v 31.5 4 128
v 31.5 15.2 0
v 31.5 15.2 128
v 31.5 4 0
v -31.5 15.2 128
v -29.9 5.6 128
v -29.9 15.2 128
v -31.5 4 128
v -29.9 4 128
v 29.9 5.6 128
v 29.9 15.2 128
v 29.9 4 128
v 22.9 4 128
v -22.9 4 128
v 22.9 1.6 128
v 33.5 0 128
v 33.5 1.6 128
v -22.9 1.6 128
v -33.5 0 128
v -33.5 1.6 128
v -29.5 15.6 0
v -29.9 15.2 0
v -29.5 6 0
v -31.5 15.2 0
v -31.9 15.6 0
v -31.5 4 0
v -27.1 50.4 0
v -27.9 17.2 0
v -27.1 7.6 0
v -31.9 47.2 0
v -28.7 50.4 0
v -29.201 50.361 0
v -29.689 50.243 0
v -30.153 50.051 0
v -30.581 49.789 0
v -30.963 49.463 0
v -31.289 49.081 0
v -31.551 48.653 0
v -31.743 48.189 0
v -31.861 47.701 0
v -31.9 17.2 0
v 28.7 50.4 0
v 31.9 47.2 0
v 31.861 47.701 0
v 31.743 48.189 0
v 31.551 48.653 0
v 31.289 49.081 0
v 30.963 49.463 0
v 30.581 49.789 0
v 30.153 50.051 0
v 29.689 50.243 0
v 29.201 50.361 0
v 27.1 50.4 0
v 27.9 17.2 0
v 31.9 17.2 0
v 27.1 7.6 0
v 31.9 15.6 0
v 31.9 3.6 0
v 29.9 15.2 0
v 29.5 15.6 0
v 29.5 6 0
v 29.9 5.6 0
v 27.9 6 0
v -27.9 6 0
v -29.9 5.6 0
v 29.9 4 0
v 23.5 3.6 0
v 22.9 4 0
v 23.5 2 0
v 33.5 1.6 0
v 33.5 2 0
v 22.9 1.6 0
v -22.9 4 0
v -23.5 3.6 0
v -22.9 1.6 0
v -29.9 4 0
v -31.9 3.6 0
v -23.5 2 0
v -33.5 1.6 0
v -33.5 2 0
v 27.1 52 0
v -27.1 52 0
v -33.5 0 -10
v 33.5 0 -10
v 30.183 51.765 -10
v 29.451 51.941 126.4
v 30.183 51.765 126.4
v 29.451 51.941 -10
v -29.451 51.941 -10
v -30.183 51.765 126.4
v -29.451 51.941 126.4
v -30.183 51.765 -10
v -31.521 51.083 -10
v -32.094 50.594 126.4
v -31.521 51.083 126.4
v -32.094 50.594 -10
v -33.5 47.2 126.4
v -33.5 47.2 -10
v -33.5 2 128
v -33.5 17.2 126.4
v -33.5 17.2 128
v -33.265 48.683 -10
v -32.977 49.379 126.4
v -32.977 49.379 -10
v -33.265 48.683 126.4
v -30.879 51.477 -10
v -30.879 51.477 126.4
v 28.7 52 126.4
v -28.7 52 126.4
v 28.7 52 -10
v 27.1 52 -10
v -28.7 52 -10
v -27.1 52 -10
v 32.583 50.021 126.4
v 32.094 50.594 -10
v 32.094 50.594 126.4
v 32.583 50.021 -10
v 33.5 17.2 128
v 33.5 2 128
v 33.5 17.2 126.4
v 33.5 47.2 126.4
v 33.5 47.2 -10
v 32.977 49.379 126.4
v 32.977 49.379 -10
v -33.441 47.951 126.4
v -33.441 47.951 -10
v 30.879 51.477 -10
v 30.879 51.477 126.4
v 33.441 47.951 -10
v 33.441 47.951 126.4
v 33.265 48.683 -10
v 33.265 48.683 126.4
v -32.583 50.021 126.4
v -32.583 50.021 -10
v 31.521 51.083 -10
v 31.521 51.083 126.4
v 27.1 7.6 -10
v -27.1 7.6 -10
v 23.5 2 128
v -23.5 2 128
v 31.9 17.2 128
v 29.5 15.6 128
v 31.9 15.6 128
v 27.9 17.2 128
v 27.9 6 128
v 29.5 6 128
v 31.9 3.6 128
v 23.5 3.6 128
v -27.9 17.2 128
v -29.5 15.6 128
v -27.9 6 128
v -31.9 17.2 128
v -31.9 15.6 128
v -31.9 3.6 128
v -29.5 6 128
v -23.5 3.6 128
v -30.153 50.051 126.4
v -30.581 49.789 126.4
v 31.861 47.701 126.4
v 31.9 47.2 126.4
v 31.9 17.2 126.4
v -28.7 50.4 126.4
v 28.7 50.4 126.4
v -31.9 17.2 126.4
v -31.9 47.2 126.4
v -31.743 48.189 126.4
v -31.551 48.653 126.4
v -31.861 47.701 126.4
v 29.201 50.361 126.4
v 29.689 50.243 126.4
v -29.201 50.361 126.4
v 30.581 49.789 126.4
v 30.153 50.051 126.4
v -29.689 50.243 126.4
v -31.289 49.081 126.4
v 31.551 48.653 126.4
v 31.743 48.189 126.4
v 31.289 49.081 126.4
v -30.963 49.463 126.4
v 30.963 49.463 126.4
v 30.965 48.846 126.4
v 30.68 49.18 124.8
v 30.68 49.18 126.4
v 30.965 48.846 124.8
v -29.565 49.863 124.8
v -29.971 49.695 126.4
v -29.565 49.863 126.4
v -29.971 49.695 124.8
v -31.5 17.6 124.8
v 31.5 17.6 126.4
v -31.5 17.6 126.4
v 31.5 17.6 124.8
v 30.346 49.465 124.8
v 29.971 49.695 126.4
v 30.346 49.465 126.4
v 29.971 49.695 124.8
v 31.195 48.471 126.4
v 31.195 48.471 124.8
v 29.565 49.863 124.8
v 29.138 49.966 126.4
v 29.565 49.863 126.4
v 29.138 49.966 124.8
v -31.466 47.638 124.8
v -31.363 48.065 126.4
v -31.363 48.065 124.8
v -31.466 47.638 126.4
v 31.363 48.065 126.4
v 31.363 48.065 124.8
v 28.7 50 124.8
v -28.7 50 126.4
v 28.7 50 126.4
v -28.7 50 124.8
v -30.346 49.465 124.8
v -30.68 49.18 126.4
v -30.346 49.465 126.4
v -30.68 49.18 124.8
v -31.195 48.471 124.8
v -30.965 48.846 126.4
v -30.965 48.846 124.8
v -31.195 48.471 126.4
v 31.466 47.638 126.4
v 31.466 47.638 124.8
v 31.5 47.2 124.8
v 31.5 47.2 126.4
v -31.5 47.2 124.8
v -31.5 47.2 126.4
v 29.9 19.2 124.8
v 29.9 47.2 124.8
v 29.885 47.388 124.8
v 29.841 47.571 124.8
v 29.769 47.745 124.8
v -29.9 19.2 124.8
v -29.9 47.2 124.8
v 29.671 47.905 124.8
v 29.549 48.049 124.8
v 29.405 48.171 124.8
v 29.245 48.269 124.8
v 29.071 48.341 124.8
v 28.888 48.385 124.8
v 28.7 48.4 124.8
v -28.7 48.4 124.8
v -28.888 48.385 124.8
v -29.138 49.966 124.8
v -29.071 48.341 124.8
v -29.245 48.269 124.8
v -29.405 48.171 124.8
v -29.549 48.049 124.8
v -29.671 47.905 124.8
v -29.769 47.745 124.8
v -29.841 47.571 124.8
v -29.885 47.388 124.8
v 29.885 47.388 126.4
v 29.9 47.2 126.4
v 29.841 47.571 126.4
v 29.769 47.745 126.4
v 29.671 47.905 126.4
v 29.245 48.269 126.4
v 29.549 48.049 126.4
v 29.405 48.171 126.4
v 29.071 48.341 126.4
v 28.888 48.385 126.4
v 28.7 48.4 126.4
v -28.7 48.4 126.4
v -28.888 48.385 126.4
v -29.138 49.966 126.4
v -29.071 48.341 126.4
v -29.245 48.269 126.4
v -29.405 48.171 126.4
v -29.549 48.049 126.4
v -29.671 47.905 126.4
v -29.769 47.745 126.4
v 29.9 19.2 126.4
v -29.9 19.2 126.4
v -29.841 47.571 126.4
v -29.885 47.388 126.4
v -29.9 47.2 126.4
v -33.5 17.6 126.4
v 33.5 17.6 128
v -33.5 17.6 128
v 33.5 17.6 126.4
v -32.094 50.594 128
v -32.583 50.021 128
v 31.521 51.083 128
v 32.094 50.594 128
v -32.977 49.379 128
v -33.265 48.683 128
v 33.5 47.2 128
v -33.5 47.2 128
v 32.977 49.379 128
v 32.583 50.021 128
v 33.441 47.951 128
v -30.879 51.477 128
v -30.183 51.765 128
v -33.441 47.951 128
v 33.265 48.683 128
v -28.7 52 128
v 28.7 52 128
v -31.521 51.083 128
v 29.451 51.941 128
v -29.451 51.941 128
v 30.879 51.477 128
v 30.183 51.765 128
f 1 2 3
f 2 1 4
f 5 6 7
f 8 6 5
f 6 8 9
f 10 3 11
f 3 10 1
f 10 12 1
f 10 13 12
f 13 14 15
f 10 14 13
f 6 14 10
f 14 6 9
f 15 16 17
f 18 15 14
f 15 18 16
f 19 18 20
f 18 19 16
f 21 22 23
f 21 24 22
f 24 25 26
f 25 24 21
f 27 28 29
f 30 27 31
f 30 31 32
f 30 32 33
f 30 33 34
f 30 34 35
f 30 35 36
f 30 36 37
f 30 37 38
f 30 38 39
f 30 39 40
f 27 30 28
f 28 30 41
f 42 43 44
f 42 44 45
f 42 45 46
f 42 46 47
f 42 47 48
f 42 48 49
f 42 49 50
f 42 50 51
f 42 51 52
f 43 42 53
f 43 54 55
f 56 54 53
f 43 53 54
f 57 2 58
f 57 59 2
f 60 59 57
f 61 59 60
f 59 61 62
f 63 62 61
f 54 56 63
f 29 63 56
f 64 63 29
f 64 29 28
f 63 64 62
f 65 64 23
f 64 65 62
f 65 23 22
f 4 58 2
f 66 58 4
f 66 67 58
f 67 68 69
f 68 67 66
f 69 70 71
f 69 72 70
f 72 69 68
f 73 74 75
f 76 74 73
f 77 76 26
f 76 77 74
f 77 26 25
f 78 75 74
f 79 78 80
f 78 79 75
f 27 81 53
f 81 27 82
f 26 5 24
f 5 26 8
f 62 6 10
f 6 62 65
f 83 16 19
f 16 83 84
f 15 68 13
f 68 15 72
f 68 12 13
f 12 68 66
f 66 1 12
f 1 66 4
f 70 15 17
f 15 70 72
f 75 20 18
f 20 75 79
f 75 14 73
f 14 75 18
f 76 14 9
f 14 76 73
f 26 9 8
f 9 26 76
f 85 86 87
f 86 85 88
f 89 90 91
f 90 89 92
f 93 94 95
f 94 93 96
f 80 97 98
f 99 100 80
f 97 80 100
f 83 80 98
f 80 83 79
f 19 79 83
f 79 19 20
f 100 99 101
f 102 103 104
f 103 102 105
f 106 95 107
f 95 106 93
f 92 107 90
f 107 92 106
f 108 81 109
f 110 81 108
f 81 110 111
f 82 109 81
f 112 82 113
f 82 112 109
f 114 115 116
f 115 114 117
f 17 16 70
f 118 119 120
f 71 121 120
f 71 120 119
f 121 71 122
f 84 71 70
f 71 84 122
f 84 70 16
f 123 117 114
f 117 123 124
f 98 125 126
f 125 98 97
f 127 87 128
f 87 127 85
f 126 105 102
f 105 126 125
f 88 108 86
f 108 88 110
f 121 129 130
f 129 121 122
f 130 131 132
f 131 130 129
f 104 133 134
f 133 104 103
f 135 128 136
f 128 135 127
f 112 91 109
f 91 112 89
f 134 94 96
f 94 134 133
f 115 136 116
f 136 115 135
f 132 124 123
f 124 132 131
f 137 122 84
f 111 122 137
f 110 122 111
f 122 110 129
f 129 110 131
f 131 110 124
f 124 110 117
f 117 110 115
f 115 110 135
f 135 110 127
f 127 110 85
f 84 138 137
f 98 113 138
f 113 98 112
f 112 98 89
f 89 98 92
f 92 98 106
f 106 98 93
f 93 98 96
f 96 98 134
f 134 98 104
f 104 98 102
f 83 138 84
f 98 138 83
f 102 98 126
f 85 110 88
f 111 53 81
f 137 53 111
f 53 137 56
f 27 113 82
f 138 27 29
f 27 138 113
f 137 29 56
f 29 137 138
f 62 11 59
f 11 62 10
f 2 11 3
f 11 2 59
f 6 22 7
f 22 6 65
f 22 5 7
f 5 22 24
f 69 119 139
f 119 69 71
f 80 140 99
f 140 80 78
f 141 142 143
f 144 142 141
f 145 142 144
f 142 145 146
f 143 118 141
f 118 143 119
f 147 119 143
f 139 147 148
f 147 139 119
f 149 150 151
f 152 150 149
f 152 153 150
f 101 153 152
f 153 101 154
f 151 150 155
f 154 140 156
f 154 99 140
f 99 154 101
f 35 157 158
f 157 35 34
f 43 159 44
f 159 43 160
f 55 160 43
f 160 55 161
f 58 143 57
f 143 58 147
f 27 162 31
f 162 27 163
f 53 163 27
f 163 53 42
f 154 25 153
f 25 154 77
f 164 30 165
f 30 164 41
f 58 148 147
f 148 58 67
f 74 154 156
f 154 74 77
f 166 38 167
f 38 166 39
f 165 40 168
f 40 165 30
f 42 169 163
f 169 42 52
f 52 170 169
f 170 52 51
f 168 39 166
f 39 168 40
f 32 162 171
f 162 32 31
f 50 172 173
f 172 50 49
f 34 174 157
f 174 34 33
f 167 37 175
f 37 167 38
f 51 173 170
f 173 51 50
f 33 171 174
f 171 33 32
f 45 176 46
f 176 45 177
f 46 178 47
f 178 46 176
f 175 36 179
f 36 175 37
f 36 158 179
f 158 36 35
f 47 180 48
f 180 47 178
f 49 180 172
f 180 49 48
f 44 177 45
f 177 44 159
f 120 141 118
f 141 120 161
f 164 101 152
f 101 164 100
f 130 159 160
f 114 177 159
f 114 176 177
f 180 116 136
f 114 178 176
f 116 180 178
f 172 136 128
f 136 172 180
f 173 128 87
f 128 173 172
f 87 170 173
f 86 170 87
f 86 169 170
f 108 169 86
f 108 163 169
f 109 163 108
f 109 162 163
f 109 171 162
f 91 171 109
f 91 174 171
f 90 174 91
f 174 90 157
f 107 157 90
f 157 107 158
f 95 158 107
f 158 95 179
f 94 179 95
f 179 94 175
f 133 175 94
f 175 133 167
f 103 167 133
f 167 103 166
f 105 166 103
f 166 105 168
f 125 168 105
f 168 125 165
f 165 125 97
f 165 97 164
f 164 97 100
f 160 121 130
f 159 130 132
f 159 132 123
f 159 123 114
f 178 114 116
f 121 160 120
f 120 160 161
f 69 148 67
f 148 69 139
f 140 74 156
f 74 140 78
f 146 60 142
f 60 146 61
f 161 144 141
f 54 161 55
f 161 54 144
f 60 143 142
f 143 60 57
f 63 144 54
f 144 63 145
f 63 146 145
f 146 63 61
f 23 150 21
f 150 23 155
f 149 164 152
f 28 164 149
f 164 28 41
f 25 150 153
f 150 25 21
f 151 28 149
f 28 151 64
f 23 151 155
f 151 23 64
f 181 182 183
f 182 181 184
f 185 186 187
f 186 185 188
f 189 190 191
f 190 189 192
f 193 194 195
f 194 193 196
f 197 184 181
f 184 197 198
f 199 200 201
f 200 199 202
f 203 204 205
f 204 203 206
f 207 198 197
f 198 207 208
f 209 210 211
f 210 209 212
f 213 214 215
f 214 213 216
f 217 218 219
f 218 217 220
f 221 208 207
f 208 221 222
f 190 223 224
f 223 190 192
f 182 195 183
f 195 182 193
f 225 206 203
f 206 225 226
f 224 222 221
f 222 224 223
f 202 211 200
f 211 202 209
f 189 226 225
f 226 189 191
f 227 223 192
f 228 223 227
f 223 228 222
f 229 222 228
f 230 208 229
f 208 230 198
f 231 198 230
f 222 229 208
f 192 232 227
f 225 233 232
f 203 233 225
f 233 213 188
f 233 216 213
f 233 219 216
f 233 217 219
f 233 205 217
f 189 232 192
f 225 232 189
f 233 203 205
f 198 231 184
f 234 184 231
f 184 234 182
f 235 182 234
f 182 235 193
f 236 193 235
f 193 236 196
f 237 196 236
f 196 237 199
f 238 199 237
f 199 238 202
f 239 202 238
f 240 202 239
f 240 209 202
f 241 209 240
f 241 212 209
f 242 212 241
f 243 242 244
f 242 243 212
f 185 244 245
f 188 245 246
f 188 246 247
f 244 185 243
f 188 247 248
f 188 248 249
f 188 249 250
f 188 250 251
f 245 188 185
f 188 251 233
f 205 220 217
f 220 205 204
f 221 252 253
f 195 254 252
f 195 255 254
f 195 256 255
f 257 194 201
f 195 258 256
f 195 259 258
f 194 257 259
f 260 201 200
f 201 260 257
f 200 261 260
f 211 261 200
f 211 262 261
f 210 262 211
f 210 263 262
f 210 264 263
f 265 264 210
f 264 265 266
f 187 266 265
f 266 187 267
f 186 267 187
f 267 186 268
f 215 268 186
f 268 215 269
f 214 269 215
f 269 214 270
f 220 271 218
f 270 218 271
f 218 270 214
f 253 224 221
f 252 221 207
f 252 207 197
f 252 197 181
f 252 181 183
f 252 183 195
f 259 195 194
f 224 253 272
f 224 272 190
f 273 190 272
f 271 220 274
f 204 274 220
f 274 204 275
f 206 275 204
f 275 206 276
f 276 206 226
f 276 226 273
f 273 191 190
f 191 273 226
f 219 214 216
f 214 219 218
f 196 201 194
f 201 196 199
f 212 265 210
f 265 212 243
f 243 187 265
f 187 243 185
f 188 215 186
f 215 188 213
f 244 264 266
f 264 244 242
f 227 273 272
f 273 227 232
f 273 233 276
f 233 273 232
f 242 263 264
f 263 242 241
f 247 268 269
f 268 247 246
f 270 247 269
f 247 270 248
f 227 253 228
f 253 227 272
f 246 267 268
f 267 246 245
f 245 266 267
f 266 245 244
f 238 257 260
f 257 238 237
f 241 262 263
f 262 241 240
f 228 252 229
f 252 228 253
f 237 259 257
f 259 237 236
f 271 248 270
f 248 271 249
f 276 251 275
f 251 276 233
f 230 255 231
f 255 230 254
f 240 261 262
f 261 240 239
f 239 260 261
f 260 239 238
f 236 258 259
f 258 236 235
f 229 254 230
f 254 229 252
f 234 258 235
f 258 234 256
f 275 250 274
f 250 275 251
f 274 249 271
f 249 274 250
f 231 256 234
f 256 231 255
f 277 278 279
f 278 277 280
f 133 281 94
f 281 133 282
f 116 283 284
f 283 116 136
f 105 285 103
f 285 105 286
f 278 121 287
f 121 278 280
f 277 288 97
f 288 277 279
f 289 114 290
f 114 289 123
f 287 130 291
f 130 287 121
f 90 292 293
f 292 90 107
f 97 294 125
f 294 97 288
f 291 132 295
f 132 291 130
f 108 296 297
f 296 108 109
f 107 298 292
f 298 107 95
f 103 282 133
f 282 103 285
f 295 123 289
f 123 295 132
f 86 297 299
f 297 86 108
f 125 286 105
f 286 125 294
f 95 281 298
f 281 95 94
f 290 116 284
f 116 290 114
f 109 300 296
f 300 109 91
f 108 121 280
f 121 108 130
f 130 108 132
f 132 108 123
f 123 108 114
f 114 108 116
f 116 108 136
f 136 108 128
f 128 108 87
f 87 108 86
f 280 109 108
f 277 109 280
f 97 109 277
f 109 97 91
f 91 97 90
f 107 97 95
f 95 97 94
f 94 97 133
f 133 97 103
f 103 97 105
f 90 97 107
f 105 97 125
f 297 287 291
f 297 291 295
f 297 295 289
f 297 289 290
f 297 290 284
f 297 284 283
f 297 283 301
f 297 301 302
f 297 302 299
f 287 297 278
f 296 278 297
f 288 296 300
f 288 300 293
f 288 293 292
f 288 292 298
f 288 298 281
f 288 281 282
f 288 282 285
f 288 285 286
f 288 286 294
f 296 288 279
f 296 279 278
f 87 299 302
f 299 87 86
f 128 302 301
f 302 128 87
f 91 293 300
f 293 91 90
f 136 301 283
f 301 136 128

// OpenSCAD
// Cord case - hollow box with 1mm wall thickness
// Height: 12.7cm (127mm)
// box_length: 6.7cm (67mm)
// back_path_width: 2cm (20mm)

// Parameters
front_path_height = 128;      // Height in mm
bottom_path_height = 10;
box_length = 67;       // box_length in mm
back_path_width = 20;        // back_path_width in mm
front_path_width = 50;        // back_path_width in mm
wall_thickness = 1.6; // Wall thickness in mm
connection_box_length = 10;
tolerance = 0.4;

// Function to create a cube that is centered in x, but not in y and z
module c_cube(size_x, size_y, size_z) {
    translate([0, size_y/2, size_z/2])
        cube([size_x, size_y, size_z], center=true);
}


module rounded_box(size_x, size_y, size_z, round_size) {
    hull() {
            // Main body shortened on positive y side
            c_cube(size_x, size_y-round_size, size_z);
            
            // Round corner cylinders on positive y side with larger radius
            translate([size_x/2 - round_size, size_y - round_size, 0])
                cylinder(r=round_size, h=size_z, $fn=40);
                
            translate([-size_x/2 + round_size, size_y - round_size, 0])
                cylinder(r=round_size, h=size_z, $fn=40);
    }
}

// Front box module
module front_part() {
    difference() {
        // Outer box
        // Outer box with more rounded corners on the positive y side
        rounded_box(box_length, front_path_width, front_path_height, 3*wall_thickness);
        
        // Inner cutout with matching rounded corners
        translate([0, wall_thickness, 0])
           rounded_box(box_length-2*wall_thickness, front_path_width-2*wall_thickness, front_path_height, 2*wall_thickness);

        // Lip cutout
        translate([0, 2*wall_thickness+2*tolerance + back_path_width-2*wall_thickness-(2*wall_thickness+2*tolerance)-wall_thickness, front_path_height - wall_thickness])
            rounded_box(box_length, front_path_width, front_path_height, wall_thickness);

        // Connection cutout
        translate([0, 0, 0])
            c_cube(box_length - 2*connection_box_length, 
                  front_path_width - wall_thickness, 
                  front_path_height);
    }
    
    // Rails
    // Right
    translate([box_length/2-wall_thickness-(wall_thickness+2*tolerance)/2, back_path_width-3*wall_thickness-(2*wall_thickness+2*tolerance)+wall_thickness+2*tolerance, 0])
        c_cube(wall_thickness+2*tolerance, 
                  wall_thickness, 
                  front_path_height);
    translate([box_length/2-wall_thickness-(wall_thickness+2*tolerance)-wall_thickness/2, 2*wall_thickness+2*tolerance, 0])
        c_cube(wall_thickness, 
                  back_path_width-2*wall_thickness-(2*wall_thickness+2*tolerance)-wall_thickness, 
                  front_path_height);
    // Left
    translate([-(box_length/2-wall_thickness-(wall_thickness+2*tolerance)/2), back_path_width-3*wall_thickness-(2*wall_thickness+2*tolerance)+wall_thickness+2*tolerance, 0])
        c_cube(wall_thickness+2*tolerance, 
                  wall_thickness, 
                  front_path_height);
    translate([-(box_length/2-wall_thickness-(wall_thickness+2*tolerance)-wall_thickness/2), 2*wall_thickness+2*tolerance, 0])
        c_cube(wall_thickness, 
                  back_path_width-2*wall_thickness-(2*wall_thickness+2*tolerance)-wall_thickness, 
                  front_path_height);
}

// Back box module
module back_part() {
    base_box_length = wall_thickness*3+tolerance*2;
    
    // Back part
    difference() {
        c_cube(box_length-2*wall_thickness-2*tolerance, wall_thickness*3+tolerance*2, front_path_height);
        
        translate([box_length/2-connection_box_length/2-tolerance, wall_thickness, 0])
            c_cube(connection_box_length+tolerance, wall_thickness+2*tolerance, front_path_height);
        translate([-(box_length/2-connection_box_length/2-tolerance), wall_thickness, 0])
            c_cube(connection_box_length+tolerance, wall_thickness+2*tolerance, front_path_height);
    }
    
    // Front pannel
    c_cube(box_length, wall_thickness, front_path_height);
    
    // Side pannel
    translate([box_length/2-wall_thickness-tolerance-wall_thickness/2,2*wall_thickness+2*tolerance, 0])
        c_cube(wall_thickness, back_path_width-3*wall_thickness-(2*wall_thickness+2*tolerance), front_path_height);
    translate([-(box_length/2-wall_thickness-tolerance-wall_thickness/2),2*wall_thickness+2*tolerance, 0])
        c_cube(wall_thickness, back_path_width-3*wall_thickness-(2*wall_thickness+2*tolerance), front_path_height);

    // Base part
    translate([0,0, -bottom_path_height])
        c_cube(box_length, wall_thickness+tolerance, bottom_path_height);
    translate([0, wall_thickness+tolerance, -bottom_path_height])
        difference() {
            rounded_box(box_length, front_path_width, bottom_path_height, 3*wall_thickness);

            // Open for cord input
            translate([0, base_box_length, 0])
                c_cube(box_length - 8*wall_thickness, front_path_width, bottom_path_height);
        }
}

module lip() {
    // Top
    rounded_box(box_length, front_path_width-back_path_width+3*wall_thickness-tolerance, wall_thickness, 3*wall_thickness);

    // Lip snap path
    translate([0, 0, -wall_thickness]) 
        difference() {
            length = box_length-2*wall_thickness-2*tolerance;
            width = front_path_width-back_path_width+2*wall_thickness-2*tolerance;
            rounded_box(length, width, wall_thickness, 2*wall_thickness-tolerance);
            
            translate([0, wall_thickness, 0])
                rounded_box(length-2*wall_thickness, width-2*wall_thickness, wall_thickness, wall_thickness-tolerance);
        }
}

module render(target="both") {
    if (target=="front") {
        front_part();
    } else if (target=="back") {
        back_part();
    } else if (target=="lip") {
        rotate([0, 180, 0]) lip();
    } else {
        back_part();
        translate([0, wall_thickness+tolerance, 0])
            front_part();
        translate([0, 2*wall_thickness+2*tolerance + back_path_width-2*wall_thickness-(2*wall_thickness+2*tolerance)-wall_thickness + tolerance + wall_thickness + tolerance, front_path_height - wall_thickness])
            lip();
    }
}

// Render all
// render("back");
// render("front");
// render("lip");
render();
